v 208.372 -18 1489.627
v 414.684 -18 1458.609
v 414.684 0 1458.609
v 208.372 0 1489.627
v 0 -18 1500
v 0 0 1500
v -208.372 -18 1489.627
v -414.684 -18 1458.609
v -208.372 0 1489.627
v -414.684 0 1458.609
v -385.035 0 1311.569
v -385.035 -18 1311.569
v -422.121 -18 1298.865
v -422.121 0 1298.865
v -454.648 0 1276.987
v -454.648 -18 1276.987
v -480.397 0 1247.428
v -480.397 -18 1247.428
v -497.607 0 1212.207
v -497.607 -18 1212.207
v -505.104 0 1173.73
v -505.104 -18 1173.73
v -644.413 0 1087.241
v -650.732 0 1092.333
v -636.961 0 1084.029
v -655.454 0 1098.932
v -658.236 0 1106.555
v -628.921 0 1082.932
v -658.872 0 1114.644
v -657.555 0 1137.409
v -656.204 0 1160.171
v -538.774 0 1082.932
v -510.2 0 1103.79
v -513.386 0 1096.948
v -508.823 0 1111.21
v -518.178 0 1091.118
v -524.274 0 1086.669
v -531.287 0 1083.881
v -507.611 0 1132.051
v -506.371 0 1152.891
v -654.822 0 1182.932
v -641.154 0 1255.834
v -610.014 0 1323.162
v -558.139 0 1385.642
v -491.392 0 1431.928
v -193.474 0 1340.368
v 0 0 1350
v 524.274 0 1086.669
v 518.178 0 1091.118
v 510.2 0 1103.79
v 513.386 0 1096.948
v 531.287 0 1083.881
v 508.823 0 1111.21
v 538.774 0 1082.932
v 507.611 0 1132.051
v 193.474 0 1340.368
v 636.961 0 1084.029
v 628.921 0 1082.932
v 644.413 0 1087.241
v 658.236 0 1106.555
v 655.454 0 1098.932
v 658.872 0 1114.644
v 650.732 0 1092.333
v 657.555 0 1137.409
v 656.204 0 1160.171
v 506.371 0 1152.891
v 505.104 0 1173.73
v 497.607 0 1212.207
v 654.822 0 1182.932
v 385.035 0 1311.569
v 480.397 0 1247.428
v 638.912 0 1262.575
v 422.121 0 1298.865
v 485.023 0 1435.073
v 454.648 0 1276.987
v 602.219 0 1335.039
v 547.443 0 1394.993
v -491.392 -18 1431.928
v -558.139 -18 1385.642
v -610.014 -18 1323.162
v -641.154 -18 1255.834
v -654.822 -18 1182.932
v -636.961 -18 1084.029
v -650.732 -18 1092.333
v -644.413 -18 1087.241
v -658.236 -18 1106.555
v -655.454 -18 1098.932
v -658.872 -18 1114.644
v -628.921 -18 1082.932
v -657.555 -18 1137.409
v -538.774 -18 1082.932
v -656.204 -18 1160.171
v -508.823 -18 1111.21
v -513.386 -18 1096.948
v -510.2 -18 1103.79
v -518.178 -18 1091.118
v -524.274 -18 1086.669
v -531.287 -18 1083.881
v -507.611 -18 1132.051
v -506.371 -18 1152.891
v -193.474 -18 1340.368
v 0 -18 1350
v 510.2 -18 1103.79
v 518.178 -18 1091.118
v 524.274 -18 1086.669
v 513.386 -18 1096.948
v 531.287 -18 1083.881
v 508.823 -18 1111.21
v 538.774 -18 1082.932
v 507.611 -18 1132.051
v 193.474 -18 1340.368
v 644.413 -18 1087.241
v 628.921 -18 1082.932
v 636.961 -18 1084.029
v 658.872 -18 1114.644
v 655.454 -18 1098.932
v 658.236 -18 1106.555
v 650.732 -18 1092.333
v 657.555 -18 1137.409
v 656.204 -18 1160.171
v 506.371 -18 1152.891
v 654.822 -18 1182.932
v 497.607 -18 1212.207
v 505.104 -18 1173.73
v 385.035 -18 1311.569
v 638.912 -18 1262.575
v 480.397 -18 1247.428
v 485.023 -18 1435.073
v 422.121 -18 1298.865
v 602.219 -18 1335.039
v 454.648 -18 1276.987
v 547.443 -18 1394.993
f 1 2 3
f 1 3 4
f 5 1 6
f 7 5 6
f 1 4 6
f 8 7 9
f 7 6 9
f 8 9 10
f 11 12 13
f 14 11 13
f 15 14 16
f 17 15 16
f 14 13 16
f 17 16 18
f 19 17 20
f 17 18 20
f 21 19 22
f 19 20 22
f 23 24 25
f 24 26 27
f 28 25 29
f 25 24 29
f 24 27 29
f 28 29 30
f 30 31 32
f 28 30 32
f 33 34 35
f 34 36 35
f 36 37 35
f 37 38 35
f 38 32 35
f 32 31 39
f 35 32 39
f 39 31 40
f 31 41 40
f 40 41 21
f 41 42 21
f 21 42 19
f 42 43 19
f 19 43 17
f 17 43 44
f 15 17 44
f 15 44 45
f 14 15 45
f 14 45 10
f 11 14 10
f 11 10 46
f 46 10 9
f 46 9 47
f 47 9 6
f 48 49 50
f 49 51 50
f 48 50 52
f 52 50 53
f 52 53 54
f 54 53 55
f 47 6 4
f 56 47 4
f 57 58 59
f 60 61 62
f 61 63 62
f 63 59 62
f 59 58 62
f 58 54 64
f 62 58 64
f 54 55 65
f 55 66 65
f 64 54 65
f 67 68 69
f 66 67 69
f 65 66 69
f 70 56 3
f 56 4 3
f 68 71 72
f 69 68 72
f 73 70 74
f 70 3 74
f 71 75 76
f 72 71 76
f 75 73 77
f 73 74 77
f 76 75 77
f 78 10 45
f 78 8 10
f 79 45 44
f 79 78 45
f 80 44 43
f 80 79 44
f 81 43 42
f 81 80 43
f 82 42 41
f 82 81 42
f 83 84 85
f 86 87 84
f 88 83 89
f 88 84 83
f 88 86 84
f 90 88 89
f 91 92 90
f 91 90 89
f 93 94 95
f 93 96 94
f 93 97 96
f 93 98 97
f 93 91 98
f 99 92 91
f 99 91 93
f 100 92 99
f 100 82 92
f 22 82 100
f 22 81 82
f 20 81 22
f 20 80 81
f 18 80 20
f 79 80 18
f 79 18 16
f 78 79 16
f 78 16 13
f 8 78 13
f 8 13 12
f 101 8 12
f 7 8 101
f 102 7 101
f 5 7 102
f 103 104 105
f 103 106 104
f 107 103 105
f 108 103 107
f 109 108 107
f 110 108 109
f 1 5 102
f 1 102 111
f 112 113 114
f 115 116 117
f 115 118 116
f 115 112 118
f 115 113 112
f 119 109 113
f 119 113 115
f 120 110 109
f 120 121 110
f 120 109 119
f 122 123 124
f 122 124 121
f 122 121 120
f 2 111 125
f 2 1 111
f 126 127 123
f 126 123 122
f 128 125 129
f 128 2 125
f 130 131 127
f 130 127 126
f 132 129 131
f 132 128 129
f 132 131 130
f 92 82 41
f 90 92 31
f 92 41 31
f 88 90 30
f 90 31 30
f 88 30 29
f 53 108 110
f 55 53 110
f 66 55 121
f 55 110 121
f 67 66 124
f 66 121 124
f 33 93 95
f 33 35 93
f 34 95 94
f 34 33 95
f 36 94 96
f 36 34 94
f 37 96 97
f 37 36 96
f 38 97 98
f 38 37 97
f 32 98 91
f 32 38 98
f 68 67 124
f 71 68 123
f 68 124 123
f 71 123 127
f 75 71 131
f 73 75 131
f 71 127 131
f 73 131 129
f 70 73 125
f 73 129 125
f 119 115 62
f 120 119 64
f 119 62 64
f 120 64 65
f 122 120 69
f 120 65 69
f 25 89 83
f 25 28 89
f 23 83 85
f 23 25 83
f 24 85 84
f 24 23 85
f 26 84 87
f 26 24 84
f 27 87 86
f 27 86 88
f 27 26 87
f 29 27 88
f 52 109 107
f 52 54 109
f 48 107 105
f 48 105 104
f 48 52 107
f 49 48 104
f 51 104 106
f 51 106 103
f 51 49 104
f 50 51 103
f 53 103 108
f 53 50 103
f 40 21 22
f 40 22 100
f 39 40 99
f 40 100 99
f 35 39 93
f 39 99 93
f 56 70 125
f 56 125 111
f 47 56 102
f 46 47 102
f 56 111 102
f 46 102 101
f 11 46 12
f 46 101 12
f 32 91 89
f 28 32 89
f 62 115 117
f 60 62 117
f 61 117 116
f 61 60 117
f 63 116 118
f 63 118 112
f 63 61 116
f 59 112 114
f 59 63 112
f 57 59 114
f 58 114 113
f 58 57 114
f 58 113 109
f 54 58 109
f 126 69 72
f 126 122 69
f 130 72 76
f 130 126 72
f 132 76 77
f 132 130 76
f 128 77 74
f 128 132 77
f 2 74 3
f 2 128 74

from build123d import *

# Parameters (mm, degrees)
F1_DEPTH = 18
F2_R     = 300
F4_DEPTH = 18.0010001
F5_R     = 30


# Not quite as in the source:
# - a feature names something its author has since deleted; it is built from what else it names


with BuildPart() as f1:
    # F0 (on Front) → F1 (new body)
    with BuildSketch(Plane.XZ):
        with BuildLine():
            Line((-685, 200), (-685, 0))
            Line((-685, 0), (685, 0))
            Line((685, 0), (685, 200))
            ThreePointArc((685, 200), (673.7460477003, 800.4217267888), (640, 1400))
            ThreePointArc((640, 1400), (0, 1500), (-640, 1400))
            ThreePointArc((-640, 1400), (-673.7460477003, 800.4217267888), (-685, 200))
        make_face()
    extrude(amount=F1_DEPTH)

    # F2
    f2_edges = [f1.edges().sort_by_distance(p)[0] for p in [
        (-640, -9, 1400),
        (640, -9, 1400),
    ]]
    fillet(f2_edges, radius=F2_R)

    # F3 (on face) → F4 (cut, through all)
    with BuildSketch(Plane.XZ.offset(18)):
        with BuildLine():
            ThreePointArc((-385.0351790184, 1311.5685143294), (-468.492433607, 1263.0523750474), (-505.1041546871, 1173.7298639214))
            ThreePointArc((-505.1041546871, 1173.7298639214), (-507.8289943623, 1128.3346974136), (-510.4237596585, 1082.9319102019))
            Line((-510.4237596585, 1082.9319102019), (-660.6541901542, 1082.9319102019))
            ThreePointArc((-660.6541901542, 1082.9319102019), (-678.9123910716, 641.6337499869), (-685, 200))
            Line((-685, 200), (-685, 0))
            Line((-685, 0), (685, 0))
            Line((685, 0), (685, 200))
            ThreePointArc((685, 200), (678.9123910716, 641.6337499869), (660.6541901542, 1082.9319102019))
            Line((660.6541901542, 1082.9319102019), (510.4237596585, 1082.9319102019))
            ThreePointArc((510.4237596585, 1082.9319102019), (507.8289943623, 1128.3346974136), (505.1041546871, 1173.7298639214))
            ThreePointArc((505.1041546871, 1173.7298639214), (468.492433607, 1263.0523750474), (385.0351790184, 1311.5685143294))
            ThreePointArc((385.0351790184, 1311.5685143294), (0, 1350), (-385.0351790184, 1311.5685143294))
        make_face()
    extrude(amount=-F4_DEPTH, mode=Mode.SUBTRACT)

    # F5
    f5_edges = [f1.edges().sort_by_distance(p)[0] for p in [
        (-510.42376, -9, 1082.93191),
        (510.42376, -9, 1082.93191),
        (-660.65419, -9, 1082.93191),
        (660.65419, -9, 1082.93191),
    ]]
    fillet(f5_edges, radius=F5_R)


solid = f1.part
